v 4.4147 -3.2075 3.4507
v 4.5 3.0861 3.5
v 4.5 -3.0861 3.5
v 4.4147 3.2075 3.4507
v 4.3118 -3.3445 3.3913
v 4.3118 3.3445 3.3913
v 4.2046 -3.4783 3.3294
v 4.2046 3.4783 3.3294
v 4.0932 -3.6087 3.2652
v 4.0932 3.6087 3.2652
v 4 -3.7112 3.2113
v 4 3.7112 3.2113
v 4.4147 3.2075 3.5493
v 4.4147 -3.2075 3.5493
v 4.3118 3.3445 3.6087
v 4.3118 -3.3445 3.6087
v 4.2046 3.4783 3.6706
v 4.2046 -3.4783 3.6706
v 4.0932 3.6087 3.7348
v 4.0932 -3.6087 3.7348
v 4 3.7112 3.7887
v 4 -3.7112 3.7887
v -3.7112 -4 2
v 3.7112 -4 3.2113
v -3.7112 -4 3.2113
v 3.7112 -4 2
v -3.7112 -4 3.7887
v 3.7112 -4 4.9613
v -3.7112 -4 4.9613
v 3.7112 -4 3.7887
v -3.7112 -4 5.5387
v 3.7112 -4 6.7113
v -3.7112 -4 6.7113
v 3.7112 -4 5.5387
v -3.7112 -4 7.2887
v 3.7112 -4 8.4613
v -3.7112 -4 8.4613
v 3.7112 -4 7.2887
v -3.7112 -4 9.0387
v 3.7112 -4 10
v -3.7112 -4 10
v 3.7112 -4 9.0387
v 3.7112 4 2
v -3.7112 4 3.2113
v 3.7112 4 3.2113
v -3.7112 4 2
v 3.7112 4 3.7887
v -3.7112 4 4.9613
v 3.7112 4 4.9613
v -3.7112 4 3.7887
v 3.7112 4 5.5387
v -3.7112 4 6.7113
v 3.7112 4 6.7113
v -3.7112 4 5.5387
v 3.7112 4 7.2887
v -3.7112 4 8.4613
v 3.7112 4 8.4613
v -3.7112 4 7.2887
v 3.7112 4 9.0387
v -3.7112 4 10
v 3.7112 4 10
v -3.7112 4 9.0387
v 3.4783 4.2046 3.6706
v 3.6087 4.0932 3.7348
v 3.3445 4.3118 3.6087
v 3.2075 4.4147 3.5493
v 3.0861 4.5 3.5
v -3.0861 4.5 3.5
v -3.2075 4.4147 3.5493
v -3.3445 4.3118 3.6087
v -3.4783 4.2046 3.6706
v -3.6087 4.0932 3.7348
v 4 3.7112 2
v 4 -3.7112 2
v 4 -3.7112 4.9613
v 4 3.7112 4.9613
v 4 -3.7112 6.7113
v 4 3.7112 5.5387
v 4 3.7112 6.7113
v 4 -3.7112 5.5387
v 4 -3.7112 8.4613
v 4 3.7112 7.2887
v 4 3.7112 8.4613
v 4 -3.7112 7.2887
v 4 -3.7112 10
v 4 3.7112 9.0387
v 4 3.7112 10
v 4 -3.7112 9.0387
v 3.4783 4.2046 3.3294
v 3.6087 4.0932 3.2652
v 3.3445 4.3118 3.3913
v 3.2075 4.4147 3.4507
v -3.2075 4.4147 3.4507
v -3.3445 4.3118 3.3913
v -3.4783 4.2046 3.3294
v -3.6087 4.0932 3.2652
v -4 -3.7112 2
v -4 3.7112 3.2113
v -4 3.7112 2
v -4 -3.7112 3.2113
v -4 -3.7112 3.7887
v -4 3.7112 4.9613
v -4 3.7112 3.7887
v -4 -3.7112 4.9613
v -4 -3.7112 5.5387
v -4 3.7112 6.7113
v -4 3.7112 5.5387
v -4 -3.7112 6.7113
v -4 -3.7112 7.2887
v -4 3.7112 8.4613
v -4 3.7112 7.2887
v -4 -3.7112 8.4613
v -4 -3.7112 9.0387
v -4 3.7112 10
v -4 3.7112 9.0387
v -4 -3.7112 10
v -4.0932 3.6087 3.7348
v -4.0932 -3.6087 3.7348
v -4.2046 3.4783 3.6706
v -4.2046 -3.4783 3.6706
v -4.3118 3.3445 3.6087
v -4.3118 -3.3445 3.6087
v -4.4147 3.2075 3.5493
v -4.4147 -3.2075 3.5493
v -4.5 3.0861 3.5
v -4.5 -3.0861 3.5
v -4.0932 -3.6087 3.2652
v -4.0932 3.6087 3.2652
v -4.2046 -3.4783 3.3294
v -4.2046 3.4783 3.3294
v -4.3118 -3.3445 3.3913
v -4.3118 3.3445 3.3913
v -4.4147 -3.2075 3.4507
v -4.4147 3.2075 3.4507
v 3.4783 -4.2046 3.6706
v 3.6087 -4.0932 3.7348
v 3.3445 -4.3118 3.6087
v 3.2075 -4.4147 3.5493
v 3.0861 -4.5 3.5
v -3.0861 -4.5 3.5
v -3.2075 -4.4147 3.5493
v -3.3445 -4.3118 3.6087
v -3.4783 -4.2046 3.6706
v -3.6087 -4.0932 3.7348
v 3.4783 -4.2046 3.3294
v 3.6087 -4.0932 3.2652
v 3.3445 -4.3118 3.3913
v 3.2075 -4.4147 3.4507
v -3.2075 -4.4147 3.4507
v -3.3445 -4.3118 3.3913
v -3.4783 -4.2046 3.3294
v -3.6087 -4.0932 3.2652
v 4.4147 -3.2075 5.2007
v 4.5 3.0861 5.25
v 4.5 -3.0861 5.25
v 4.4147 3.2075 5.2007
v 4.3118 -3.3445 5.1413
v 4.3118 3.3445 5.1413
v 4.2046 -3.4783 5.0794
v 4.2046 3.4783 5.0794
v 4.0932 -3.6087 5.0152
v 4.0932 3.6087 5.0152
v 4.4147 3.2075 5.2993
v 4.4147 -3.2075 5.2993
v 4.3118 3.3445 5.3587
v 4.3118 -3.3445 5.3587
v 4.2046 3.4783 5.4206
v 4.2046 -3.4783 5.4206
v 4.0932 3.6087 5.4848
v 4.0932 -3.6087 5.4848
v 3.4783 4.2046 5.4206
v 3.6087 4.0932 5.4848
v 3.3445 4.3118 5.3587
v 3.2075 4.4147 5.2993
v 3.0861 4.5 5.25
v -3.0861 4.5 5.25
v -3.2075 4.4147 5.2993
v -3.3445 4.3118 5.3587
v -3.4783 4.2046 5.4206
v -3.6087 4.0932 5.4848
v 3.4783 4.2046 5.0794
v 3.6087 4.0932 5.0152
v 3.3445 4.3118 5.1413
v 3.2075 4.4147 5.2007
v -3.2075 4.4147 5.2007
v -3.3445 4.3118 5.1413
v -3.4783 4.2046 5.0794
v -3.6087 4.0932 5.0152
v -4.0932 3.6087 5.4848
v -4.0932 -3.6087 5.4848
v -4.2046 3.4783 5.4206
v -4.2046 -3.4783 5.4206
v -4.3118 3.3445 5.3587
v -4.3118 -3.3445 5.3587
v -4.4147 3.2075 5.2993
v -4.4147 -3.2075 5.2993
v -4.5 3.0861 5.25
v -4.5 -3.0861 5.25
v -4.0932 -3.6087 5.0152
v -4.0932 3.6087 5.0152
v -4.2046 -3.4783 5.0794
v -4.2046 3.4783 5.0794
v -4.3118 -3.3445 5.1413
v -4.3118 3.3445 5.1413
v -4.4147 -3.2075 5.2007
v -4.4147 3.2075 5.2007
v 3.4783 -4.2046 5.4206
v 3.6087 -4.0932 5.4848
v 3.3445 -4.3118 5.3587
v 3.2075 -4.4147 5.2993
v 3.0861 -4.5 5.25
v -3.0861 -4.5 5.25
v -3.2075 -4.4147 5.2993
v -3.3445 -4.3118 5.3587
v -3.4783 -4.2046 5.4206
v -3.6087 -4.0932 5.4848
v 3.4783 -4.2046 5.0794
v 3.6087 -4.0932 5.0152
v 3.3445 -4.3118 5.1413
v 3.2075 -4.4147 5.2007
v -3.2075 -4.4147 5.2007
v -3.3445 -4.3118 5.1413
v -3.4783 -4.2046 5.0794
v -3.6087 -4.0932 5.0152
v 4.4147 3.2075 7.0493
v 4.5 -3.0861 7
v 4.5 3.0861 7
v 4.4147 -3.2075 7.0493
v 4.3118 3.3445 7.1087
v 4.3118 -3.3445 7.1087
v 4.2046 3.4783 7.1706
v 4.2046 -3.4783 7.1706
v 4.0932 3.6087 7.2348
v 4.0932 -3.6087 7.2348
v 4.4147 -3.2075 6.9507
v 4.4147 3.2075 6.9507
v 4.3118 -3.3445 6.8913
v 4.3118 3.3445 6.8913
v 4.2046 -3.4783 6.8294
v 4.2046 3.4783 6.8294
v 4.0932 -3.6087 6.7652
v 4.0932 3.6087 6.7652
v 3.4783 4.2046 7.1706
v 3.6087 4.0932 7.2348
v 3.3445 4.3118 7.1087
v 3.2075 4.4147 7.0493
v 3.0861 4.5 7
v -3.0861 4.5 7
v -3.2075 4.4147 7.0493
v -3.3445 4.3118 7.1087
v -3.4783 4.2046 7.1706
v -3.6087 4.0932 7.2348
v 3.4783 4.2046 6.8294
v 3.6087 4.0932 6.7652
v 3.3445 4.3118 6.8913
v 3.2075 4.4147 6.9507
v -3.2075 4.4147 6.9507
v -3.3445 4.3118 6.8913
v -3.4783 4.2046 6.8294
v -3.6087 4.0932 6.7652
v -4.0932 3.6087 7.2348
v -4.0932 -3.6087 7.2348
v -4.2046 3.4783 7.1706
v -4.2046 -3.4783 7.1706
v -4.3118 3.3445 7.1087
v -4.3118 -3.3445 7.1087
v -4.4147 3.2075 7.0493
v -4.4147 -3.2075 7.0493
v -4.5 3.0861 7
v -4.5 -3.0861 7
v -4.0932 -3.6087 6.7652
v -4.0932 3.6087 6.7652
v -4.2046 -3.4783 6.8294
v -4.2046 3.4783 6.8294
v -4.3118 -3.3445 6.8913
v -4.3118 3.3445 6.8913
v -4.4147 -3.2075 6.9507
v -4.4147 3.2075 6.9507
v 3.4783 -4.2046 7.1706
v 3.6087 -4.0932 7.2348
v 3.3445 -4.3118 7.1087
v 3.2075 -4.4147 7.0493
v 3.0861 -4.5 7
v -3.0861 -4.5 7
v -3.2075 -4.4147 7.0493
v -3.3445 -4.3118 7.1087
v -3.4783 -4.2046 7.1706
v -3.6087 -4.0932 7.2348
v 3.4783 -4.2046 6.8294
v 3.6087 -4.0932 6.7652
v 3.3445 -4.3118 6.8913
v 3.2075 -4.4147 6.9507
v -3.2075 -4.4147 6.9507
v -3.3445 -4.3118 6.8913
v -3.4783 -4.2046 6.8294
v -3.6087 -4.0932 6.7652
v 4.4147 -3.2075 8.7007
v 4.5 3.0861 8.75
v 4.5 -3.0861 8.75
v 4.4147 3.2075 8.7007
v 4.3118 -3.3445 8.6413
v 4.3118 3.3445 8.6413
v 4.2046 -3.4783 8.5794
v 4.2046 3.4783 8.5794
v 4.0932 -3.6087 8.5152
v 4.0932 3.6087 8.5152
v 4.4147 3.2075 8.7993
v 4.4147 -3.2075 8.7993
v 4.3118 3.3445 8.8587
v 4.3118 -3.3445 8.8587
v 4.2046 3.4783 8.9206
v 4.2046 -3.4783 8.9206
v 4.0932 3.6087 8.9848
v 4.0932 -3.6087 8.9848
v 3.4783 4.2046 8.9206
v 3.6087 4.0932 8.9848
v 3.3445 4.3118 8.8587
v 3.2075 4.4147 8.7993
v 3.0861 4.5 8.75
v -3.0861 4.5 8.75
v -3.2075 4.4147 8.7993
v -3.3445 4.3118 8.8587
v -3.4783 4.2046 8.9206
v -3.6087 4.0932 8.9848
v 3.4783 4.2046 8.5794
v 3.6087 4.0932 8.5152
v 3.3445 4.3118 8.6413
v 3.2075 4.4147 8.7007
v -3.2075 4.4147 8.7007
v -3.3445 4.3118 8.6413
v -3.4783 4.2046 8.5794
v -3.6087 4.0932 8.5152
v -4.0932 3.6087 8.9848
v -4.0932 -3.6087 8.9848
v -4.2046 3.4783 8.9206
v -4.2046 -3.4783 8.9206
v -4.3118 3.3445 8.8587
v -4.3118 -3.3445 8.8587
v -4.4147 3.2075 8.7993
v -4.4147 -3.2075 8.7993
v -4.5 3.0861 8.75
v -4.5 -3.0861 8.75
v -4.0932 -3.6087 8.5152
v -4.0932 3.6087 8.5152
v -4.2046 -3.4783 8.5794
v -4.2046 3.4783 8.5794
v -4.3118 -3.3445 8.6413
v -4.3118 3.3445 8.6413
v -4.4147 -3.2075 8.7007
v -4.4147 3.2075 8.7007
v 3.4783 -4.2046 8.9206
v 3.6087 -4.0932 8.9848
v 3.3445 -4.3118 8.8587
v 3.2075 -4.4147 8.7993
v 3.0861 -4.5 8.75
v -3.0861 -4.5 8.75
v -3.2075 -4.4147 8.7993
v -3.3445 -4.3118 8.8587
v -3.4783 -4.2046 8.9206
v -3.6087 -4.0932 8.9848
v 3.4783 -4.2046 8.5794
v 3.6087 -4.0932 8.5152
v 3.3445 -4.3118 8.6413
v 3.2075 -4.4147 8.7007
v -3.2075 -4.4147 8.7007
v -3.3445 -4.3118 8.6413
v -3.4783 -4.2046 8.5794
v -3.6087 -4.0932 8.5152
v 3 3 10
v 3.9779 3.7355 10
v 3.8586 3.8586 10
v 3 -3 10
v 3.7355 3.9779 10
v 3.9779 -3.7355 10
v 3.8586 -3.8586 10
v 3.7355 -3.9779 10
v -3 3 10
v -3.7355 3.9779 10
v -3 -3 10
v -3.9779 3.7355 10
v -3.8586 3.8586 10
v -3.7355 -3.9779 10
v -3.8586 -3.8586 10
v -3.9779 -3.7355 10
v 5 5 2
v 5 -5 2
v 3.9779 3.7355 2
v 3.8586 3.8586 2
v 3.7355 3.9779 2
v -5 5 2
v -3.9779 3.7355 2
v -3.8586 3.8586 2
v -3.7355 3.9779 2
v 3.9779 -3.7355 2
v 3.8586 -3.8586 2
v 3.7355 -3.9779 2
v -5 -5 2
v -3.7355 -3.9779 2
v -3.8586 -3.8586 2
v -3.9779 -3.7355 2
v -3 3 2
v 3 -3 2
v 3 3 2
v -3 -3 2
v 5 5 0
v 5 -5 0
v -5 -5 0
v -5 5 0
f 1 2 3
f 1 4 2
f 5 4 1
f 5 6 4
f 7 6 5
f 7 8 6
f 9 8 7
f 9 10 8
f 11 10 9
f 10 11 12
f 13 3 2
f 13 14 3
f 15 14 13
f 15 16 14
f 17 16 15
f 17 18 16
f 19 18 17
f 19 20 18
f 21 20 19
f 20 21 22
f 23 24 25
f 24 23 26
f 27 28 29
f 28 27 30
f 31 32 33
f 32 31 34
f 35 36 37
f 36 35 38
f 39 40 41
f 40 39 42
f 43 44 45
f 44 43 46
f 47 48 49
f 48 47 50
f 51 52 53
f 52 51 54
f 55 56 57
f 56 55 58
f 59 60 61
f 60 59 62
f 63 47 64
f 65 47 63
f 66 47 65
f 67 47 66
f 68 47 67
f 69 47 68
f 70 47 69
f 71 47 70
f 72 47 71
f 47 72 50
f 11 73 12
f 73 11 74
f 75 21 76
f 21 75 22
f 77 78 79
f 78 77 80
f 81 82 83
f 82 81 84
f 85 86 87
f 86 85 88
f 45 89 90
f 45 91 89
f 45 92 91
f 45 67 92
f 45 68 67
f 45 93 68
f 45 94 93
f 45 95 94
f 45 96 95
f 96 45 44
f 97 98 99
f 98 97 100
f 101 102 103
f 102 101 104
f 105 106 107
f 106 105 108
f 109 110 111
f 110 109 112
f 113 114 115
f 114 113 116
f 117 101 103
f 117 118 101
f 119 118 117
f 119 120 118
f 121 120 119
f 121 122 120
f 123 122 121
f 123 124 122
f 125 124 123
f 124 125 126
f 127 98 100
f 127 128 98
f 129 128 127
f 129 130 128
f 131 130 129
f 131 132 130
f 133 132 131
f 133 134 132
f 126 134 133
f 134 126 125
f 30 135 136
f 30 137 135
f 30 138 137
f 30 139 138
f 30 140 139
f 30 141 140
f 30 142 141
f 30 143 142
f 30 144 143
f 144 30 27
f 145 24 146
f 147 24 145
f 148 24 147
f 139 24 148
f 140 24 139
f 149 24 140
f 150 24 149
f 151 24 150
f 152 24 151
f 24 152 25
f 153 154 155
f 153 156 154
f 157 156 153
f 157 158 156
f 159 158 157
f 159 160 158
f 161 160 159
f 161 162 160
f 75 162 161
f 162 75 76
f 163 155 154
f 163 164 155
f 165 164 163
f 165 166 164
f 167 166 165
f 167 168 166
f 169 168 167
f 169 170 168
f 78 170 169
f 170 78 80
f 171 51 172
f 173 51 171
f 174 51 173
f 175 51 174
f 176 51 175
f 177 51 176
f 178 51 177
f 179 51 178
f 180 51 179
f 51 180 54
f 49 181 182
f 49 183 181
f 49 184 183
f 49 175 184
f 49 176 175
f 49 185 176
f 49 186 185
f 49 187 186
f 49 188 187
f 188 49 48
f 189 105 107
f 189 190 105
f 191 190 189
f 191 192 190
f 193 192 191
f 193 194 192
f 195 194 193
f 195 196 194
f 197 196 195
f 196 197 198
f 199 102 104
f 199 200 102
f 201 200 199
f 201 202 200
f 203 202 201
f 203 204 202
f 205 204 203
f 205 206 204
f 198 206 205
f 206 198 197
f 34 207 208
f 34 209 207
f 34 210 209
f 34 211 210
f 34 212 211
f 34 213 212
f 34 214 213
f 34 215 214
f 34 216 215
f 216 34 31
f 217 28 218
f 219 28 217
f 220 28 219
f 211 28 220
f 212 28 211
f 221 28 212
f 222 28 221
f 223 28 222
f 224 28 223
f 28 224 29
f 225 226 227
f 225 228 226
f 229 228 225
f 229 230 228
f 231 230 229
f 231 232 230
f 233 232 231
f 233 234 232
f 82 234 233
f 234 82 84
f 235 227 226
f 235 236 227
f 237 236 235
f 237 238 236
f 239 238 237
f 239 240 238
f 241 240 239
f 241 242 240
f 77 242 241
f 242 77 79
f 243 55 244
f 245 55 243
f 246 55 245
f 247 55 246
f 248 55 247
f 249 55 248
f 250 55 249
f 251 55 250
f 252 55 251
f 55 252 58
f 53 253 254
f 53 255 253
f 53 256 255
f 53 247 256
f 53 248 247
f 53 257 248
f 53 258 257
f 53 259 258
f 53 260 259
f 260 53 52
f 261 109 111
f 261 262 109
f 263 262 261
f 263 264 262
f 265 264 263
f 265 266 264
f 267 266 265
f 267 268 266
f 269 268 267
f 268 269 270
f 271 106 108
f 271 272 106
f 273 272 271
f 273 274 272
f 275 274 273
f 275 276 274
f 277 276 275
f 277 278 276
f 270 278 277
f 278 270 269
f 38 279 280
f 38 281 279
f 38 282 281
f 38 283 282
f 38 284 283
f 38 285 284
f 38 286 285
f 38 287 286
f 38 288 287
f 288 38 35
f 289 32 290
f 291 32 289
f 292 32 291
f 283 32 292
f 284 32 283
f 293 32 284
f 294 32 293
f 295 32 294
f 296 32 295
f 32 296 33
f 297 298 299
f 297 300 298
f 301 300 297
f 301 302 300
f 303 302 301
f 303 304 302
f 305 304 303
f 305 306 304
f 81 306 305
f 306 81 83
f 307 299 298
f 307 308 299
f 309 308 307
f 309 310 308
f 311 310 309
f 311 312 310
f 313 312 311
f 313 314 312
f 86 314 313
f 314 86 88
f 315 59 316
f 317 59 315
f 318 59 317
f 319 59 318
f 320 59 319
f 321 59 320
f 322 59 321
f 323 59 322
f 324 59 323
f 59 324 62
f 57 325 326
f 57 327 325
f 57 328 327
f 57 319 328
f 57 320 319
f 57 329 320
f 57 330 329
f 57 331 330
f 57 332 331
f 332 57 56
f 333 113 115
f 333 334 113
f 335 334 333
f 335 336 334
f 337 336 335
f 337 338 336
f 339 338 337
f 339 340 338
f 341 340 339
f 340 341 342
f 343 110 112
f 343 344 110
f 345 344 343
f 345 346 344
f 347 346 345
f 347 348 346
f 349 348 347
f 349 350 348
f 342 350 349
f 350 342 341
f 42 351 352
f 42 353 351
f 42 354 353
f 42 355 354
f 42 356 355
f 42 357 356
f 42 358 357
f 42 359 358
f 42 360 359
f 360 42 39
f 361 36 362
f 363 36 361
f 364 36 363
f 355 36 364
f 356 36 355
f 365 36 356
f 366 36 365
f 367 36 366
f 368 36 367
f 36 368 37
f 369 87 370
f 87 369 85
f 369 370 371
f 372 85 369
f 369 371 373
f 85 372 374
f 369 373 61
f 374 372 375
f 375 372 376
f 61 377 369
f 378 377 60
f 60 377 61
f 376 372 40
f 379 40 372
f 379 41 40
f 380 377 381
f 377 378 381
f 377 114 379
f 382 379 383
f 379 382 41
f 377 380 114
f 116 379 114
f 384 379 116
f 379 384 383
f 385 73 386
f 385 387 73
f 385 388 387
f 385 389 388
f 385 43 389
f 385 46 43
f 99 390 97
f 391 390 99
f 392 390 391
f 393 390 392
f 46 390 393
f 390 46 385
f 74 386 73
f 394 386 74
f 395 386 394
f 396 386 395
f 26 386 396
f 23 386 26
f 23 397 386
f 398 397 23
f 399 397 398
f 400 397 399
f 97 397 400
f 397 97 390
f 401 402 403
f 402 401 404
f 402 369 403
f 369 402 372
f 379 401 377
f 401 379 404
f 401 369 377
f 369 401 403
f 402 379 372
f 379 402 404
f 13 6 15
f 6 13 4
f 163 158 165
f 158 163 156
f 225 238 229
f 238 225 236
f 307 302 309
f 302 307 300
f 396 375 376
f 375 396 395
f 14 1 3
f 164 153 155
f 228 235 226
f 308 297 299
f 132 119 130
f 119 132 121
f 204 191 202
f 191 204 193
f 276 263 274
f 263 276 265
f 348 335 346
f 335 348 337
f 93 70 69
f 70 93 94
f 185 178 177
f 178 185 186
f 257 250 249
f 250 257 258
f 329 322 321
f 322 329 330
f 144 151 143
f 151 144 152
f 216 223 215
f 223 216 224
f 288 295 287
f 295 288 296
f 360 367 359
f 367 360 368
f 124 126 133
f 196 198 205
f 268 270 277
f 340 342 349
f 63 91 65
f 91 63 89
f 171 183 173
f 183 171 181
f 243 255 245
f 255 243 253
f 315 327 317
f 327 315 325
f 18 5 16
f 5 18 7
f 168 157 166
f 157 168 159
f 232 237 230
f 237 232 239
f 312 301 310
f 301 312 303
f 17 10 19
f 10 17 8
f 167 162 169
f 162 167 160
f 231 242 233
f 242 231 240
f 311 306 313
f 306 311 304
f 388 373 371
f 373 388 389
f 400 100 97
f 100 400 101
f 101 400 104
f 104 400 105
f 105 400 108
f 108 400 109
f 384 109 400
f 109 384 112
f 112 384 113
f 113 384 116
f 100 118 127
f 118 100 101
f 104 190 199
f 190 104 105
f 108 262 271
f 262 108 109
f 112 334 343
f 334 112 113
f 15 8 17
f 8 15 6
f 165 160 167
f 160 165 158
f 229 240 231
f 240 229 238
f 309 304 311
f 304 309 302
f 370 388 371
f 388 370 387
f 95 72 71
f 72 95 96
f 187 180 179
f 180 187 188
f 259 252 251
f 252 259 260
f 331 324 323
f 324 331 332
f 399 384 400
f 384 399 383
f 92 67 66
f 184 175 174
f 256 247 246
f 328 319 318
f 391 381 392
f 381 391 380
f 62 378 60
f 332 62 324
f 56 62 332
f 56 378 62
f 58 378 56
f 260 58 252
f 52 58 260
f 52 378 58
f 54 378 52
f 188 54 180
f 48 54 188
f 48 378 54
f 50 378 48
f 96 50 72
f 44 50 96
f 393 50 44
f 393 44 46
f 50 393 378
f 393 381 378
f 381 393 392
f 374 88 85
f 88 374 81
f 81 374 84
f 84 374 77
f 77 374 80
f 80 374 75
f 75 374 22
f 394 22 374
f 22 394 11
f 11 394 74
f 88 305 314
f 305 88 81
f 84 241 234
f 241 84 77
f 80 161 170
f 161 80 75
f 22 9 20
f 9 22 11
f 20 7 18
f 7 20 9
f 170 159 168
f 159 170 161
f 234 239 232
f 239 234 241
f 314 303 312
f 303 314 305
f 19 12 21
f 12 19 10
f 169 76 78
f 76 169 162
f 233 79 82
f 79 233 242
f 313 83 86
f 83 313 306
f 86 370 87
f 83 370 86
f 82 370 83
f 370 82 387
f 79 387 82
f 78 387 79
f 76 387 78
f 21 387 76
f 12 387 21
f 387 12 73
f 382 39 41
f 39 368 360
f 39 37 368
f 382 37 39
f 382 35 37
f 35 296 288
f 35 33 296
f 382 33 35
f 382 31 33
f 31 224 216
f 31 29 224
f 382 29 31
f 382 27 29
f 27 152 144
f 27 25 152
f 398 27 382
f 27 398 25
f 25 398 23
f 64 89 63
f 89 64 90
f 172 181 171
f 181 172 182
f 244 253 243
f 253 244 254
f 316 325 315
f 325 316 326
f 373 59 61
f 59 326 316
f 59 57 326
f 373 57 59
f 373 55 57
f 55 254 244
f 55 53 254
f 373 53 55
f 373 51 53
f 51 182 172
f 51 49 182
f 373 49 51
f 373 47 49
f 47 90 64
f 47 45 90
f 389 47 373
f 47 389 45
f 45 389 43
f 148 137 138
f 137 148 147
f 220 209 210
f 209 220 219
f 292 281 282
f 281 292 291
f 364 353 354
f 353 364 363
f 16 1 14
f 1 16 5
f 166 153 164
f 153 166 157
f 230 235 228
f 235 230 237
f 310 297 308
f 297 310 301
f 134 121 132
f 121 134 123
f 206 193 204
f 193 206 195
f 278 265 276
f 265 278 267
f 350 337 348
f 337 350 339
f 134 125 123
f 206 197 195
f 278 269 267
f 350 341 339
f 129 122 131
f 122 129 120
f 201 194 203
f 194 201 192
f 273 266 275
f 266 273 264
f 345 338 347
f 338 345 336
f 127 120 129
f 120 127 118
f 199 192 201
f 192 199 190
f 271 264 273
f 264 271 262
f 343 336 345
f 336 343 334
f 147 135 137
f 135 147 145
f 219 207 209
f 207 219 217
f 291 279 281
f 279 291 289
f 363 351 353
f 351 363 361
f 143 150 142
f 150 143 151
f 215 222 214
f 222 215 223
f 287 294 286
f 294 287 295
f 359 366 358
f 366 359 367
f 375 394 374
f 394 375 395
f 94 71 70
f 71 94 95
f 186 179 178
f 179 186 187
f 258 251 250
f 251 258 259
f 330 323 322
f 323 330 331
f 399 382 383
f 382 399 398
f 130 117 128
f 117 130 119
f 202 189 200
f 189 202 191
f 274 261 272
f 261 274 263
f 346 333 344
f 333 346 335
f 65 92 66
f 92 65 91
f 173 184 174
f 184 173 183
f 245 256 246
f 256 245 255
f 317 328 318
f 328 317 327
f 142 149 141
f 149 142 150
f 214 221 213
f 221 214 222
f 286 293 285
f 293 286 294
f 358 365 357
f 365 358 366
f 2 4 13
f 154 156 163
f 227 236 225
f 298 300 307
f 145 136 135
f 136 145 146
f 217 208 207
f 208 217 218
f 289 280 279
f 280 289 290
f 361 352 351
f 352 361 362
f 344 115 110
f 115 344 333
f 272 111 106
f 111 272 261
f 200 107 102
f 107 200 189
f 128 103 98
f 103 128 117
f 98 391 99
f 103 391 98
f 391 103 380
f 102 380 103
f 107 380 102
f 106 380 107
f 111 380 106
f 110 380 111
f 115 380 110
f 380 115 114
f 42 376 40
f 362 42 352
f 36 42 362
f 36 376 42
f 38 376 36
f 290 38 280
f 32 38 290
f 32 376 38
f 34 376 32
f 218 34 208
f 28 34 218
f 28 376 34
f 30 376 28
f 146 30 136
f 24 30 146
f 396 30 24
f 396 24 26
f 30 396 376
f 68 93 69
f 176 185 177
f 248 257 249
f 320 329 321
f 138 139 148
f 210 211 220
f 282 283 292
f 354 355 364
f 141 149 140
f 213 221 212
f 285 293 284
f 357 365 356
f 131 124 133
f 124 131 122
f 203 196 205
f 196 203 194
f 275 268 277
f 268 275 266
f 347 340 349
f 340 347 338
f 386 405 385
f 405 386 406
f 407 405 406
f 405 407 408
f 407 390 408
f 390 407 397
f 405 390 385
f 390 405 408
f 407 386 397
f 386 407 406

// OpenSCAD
//$fn=50;
ueberstand=0.5;

// deckel
translate([-5,-5,0]) cube([10,10,2]);

// innenteil
translate([0,0,2])
intersection(){
    difference() {
        union() {
            // aussenwand innenteil
            translate([0,0,4]) cube([8,8,8], center=true);
            // riffel
            for( i = [0:3] ) {
                //translate([0,0,1.5+i*1.75]) cube([8+2*ueberstand,8+2*ueberstand,1], center=true);
                for (angle = [0 : 90 : 270]) {
                     translate([0,0,1.5+i*1.75]) rotate([0,0,angle]) translate([4,0,0]) rotate([90,0,0])
                        cylinder(h=8, r=ueberstand, center=true, $fn=3);
                }
            }
        }
        // hohlraum innen
        cube([6,6,30], center=true);
    }
    // überstehende kanten an den ecken des innenteils entfernen
    // rotate([0,0,45]) cube([sqrt(2)*8,sqrt(2)*8,30], center=true);
    cylinder(h=30, r=sqrt(2)*8/2-0.2, $fn=200);
}
